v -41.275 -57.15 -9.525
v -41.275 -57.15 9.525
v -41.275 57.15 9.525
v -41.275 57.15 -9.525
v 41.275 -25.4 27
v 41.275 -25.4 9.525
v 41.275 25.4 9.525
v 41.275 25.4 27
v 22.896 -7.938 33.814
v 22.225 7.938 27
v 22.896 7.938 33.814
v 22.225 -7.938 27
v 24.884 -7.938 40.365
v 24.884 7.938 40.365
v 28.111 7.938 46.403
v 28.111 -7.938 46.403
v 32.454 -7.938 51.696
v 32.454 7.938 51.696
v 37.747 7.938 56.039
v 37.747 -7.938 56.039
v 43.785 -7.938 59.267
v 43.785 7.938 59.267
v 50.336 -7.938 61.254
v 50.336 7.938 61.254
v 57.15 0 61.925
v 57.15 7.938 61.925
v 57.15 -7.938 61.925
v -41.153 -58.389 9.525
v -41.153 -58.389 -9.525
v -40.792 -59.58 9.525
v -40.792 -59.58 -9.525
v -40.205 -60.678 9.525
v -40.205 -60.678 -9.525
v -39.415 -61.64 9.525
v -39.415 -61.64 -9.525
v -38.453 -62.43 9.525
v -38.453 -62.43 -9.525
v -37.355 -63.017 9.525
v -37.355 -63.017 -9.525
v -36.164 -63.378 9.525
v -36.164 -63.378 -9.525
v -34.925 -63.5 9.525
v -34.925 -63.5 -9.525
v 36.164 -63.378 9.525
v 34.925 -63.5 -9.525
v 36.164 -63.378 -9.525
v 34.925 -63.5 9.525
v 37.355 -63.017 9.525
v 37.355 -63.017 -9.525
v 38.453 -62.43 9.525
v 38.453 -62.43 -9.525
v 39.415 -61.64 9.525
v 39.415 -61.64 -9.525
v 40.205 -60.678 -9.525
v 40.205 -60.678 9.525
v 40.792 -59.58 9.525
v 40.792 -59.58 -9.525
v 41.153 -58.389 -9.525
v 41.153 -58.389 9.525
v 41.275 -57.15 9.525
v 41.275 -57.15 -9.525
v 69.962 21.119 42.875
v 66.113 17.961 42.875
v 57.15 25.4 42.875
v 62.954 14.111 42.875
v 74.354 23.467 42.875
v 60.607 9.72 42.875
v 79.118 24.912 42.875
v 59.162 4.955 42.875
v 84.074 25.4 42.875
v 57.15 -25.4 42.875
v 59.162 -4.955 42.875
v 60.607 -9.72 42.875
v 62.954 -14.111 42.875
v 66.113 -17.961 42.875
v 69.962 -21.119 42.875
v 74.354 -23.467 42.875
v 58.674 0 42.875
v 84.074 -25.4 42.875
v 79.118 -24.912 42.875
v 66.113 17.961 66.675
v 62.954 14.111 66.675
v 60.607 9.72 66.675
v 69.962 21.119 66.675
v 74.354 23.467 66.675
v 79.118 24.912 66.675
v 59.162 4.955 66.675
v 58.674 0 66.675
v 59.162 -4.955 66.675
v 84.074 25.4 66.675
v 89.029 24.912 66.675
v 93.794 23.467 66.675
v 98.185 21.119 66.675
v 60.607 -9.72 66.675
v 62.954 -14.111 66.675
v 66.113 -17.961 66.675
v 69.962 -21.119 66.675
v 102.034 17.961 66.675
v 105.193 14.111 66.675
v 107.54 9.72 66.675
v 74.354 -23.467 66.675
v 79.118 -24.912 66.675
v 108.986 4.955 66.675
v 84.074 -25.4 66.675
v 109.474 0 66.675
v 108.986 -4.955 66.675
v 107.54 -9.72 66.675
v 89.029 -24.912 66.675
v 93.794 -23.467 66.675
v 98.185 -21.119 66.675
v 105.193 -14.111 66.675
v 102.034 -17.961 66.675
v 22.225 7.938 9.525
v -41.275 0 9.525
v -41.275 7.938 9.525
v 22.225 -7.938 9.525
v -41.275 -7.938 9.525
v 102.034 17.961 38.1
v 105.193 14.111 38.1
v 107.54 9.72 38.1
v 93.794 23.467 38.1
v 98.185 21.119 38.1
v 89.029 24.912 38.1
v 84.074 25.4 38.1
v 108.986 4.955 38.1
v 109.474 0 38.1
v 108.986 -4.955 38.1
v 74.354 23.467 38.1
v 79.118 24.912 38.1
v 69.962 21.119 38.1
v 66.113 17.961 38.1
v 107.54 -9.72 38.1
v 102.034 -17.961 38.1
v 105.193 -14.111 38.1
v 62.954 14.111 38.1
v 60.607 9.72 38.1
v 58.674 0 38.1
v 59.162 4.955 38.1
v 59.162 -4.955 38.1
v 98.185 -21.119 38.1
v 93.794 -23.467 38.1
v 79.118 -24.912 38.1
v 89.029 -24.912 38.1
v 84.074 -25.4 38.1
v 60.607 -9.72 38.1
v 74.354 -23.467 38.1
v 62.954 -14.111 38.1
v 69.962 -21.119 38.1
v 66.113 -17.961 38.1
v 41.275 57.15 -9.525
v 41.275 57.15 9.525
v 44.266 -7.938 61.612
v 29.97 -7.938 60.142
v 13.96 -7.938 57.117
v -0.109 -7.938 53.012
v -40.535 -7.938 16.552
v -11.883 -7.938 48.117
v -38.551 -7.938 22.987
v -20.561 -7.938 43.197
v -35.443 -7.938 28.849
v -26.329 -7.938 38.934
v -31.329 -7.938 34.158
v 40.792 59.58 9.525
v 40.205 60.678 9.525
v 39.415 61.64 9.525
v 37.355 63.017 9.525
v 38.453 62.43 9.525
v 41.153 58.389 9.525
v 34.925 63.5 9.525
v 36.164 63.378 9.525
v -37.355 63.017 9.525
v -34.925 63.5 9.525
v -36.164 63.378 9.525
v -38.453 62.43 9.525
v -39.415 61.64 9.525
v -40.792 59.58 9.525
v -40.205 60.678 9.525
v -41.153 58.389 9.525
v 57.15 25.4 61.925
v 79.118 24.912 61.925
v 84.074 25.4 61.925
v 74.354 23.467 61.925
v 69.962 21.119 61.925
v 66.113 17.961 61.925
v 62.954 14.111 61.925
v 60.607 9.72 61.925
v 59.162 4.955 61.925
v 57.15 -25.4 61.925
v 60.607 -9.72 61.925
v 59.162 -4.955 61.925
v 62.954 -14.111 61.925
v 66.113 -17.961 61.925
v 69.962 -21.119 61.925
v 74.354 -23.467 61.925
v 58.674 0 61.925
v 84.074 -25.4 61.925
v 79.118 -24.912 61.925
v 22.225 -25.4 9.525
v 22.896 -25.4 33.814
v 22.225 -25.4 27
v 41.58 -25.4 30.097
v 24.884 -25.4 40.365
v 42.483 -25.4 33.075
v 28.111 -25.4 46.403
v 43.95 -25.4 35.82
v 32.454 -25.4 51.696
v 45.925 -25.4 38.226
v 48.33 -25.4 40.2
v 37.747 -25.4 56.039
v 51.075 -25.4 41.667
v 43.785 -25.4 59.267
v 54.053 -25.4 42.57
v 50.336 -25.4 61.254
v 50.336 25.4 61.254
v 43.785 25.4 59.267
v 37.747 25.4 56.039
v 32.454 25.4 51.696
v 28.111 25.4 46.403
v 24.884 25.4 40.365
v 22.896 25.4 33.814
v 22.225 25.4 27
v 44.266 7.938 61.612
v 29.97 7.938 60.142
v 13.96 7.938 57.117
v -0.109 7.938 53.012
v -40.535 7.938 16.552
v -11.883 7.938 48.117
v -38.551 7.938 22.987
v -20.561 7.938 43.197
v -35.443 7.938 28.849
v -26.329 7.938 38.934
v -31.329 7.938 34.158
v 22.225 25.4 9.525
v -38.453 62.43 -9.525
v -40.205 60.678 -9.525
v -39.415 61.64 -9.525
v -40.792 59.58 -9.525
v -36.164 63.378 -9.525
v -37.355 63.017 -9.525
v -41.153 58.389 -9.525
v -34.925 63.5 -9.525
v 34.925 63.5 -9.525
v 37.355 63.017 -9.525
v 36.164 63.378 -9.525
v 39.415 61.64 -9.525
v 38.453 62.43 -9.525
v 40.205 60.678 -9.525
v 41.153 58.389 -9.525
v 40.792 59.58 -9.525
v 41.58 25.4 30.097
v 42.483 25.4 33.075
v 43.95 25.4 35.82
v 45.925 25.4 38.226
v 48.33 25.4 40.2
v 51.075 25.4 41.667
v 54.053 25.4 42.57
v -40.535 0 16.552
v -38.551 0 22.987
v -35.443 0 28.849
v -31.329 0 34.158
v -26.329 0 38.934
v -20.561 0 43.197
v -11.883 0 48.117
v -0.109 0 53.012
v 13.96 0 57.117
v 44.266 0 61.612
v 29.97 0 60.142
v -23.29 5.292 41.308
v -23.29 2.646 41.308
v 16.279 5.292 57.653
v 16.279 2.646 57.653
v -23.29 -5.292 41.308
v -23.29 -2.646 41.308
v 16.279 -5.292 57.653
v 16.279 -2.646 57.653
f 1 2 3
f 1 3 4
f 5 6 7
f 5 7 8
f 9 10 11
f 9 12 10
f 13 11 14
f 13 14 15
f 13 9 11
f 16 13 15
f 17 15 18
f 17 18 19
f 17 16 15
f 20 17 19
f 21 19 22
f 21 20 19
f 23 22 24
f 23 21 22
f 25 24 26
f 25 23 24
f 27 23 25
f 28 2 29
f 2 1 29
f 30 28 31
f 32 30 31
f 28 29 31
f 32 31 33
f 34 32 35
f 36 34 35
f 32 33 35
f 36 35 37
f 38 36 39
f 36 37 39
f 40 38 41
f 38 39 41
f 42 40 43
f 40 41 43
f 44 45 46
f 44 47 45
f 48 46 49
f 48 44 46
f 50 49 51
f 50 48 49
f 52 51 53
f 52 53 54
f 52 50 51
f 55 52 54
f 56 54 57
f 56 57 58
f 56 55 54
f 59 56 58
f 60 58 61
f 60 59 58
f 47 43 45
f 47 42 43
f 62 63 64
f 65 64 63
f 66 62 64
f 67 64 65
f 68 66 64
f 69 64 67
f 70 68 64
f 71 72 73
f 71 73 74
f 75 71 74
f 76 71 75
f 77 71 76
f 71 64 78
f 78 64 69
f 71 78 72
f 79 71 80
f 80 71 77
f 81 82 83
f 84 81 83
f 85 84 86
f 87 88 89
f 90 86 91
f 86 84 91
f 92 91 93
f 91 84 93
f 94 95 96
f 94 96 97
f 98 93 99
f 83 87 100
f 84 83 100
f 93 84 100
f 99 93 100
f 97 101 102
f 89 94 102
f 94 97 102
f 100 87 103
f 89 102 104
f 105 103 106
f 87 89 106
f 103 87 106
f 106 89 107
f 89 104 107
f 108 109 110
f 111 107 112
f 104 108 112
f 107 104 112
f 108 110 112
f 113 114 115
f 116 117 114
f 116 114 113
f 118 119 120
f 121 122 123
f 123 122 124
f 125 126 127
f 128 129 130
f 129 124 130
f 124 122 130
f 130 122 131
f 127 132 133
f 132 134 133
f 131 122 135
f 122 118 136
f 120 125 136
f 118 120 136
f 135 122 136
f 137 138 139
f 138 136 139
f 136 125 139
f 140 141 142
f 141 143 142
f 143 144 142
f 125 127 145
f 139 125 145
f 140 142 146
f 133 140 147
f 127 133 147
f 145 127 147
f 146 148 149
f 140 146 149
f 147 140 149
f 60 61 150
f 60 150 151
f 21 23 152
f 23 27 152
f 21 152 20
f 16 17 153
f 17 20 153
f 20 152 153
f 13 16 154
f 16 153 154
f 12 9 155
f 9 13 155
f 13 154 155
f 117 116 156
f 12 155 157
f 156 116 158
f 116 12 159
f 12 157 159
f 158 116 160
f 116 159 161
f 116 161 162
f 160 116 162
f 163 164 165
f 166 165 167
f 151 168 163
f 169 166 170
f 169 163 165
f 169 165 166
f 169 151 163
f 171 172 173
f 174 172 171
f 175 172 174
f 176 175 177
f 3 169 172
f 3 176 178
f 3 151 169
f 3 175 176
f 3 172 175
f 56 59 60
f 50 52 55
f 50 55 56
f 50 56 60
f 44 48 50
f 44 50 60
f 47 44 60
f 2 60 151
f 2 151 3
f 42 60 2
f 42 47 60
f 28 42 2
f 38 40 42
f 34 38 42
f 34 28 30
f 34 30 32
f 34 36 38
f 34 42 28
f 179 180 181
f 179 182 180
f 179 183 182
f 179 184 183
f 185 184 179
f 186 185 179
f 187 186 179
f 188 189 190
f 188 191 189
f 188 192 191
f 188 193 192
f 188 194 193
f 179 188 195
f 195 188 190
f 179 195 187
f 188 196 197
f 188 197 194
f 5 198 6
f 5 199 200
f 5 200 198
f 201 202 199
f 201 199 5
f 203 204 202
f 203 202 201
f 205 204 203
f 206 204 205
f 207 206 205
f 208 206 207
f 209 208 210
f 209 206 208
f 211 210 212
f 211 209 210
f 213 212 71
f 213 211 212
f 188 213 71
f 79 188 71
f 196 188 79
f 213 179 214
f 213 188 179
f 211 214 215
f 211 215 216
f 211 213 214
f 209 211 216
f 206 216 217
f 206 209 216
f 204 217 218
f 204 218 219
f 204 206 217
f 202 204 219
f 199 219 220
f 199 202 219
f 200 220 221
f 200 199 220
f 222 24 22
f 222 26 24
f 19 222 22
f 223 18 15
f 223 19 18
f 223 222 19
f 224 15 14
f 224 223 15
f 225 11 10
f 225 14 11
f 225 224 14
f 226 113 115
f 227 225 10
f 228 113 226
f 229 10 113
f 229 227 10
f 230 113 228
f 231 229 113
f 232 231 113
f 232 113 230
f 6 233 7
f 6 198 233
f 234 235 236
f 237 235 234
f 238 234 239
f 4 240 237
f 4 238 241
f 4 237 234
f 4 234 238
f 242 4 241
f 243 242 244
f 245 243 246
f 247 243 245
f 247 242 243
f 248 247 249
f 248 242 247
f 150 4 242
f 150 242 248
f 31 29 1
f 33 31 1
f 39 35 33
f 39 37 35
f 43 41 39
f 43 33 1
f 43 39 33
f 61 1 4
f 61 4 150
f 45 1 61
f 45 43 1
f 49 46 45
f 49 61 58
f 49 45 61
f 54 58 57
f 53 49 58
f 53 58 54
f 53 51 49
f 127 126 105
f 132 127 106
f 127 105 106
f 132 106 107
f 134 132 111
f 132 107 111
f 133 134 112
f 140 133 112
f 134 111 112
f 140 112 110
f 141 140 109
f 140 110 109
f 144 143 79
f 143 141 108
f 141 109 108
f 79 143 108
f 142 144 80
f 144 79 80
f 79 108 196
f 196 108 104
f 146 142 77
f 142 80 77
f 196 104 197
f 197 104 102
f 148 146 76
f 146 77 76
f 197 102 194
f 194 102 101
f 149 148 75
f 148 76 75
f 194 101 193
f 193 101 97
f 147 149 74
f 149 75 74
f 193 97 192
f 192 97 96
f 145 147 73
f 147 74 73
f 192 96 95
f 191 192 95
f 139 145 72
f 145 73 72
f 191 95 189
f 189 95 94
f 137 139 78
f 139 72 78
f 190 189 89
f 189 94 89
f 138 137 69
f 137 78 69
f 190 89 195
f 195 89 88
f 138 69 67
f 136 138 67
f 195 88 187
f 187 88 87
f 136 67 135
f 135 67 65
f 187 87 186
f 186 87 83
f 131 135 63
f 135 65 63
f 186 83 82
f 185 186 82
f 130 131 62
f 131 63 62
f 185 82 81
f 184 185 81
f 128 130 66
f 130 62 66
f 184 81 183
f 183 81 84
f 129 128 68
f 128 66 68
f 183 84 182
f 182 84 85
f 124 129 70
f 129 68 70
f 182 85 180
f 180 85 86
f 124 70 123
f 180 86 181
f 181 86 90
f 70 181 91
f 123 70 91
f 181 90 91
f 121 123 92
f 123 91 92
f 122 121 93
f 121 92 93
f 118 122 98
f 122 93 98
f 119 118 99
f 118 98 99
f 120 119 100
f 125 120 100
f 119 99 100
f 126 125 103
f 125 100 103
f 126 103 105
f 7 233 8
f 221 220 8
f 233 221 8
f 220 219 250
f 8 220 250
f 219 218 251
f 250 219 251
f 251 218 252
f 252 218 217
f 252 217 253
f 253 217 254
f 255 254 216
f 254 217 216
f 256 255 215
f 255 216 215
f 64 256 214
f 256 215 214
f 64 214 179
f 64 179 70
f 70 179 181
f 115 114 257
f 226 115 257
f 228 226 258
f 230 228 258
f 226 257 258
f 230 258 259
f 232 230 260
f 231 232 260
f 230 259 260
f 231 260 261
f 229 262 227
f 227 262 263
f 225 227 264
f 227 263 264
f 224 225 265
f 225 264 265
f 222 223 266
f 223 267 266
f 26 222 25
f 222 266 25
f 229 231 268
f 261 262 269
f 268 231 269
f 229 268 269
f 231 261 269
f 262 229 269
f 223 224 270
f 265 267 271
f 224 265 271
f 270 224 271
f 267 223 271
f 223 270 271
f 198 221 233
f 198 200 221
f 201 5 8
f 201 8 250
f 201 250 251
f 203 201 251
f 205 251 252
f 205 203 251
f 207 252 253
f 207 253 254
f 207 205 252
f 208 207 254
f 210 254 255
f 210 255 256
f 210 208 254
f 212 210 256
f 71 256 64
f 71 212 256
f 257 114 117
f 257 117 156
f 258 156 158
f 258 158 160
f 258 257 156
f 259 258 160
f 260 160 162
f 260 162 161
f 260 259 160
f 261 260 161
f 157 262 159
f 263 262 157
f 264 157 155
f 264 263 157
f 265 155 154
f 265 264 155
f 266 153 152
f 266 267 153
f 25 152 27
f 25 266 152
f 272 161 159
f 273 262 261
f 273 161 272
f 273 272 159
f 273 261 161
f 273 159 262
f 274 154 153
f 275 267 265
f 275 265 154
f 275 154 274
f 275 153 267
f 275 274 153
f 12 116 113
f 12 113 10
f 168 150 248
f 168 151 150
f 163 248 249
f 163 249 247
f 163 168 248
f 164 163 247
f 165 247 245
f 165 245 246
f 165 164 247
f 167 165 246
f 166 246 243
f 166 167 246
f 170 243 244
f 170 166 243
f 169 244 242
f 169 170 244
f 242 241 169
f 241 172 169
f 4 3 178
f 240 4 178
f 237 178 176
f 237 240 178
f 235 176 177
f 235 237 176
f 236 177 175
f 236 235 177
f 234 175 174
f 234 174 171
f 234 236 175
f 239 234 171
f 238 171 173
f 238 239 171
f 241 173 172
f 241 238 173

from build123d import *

# Parameters (mm, degrees)
F1_DEPTH = 63.5
F0_W     = 25.4
F0_H     = 19.05
F2_DEPTH = 25.4
F3_DEPTH = 7.9375
F5_R     = 6.35


with BuildPart() as f1:
    # F0 (on Front) → F1 (new body, symmetric)
    with BuildSketch(Plane.XZ):
        Polygon((-41.275, -9.525), (41.275, -9.525), (41.275, 9.525), (22.225, 9.525), (-41.275, 9.525), align=None)
    extrude(amount=F1_DEPTH, both=True)

    # F5
    f5_edges = [f1.edges().sort_by_distance(p)[0] for p in [
        (41.275, -63.5, 0),
        (-41.275, -63.5, 0),
        (41.275, 63.5, 0),
        (-41.275, 63.5, 0),
    ]]
    fillet(f5_edges, radius=F5_R)


with BuildPart() as f2:
    # F0 (on Front) → F2 (new body, symmetric)
    with BuildSketch(Plane.XZ):
        with BuildLine():
            Line((22.225, 9.525), (41.275, 9.525))
            Line((41.275, 9.525), (41.275, 27.0002))
            ThreePointArc((41.275, 27.0002), (45.9246798487, 38.2255201513), (57.15, 42.8752))
            Line((57.15, 42.8752), (58.6737903147, 42.8752))
            Line((58.6737903147, 42.8752), (58.6737903147, 61.9252))
            Line((58.6737903147, 61.9252), (57.15, 61.9252))
            ThreePointArc((57.15, 61.9252), (32.4542956671, 51.6959043329), (22.225, 27.0002))
            Line((22.225, 27.0002), (22.225, 9.525))
        make_face()
        with Locations((71.3737903147, 52.4002)):
            Rectangle(F0_W, F0_H)
    extrude(amount=F2_DEPTH, both=True)

    # F0 (on Front) → F4 (revolve)
    with BuildSketch(Plane.XZ):
        Polygon((84.0737903147, 66.675), (84.0737903147, 61.9252), (84.0737903147, 42.8752), (84.0737903147, 38.1), (109.4737903147, 38.1), (109.4737903147, 66.675), align=None)
    revolve(axis=Axis((84.0737903147, 0, 50.0126), (0, 0, -1)))


with BuildPart() as f3:
    # F0 (on Front) → F3 (new body, symmetric)
    with BuildSketch(Plane.XZ):
        with BuildLine():
            add(Edge.make_bspline(
                [(-41.275, 9.525), (-40.841195573, 50.147553981), (22.3868696331, 62.56867535), (57.15, 61.9252)],
                knots=[0, 0, 0, 0, 111.5045361635, 111.5045361635, 111.5045361635, 111.5045361635], degree=3))
            Line((-41.275, 9.525), (22.225, 9.525))
            Line((22.225, 9.525), (22.225, 27.0002))
            ThreePointArc((22.225, 27.0002), (32.4542956671, 51.6959043329), (57.15, 61.9252))
        make_face()
    extrude(amount=F3_DEPTH, both=True)


solid = Compound([f1.part, f2.part, f3.part])
